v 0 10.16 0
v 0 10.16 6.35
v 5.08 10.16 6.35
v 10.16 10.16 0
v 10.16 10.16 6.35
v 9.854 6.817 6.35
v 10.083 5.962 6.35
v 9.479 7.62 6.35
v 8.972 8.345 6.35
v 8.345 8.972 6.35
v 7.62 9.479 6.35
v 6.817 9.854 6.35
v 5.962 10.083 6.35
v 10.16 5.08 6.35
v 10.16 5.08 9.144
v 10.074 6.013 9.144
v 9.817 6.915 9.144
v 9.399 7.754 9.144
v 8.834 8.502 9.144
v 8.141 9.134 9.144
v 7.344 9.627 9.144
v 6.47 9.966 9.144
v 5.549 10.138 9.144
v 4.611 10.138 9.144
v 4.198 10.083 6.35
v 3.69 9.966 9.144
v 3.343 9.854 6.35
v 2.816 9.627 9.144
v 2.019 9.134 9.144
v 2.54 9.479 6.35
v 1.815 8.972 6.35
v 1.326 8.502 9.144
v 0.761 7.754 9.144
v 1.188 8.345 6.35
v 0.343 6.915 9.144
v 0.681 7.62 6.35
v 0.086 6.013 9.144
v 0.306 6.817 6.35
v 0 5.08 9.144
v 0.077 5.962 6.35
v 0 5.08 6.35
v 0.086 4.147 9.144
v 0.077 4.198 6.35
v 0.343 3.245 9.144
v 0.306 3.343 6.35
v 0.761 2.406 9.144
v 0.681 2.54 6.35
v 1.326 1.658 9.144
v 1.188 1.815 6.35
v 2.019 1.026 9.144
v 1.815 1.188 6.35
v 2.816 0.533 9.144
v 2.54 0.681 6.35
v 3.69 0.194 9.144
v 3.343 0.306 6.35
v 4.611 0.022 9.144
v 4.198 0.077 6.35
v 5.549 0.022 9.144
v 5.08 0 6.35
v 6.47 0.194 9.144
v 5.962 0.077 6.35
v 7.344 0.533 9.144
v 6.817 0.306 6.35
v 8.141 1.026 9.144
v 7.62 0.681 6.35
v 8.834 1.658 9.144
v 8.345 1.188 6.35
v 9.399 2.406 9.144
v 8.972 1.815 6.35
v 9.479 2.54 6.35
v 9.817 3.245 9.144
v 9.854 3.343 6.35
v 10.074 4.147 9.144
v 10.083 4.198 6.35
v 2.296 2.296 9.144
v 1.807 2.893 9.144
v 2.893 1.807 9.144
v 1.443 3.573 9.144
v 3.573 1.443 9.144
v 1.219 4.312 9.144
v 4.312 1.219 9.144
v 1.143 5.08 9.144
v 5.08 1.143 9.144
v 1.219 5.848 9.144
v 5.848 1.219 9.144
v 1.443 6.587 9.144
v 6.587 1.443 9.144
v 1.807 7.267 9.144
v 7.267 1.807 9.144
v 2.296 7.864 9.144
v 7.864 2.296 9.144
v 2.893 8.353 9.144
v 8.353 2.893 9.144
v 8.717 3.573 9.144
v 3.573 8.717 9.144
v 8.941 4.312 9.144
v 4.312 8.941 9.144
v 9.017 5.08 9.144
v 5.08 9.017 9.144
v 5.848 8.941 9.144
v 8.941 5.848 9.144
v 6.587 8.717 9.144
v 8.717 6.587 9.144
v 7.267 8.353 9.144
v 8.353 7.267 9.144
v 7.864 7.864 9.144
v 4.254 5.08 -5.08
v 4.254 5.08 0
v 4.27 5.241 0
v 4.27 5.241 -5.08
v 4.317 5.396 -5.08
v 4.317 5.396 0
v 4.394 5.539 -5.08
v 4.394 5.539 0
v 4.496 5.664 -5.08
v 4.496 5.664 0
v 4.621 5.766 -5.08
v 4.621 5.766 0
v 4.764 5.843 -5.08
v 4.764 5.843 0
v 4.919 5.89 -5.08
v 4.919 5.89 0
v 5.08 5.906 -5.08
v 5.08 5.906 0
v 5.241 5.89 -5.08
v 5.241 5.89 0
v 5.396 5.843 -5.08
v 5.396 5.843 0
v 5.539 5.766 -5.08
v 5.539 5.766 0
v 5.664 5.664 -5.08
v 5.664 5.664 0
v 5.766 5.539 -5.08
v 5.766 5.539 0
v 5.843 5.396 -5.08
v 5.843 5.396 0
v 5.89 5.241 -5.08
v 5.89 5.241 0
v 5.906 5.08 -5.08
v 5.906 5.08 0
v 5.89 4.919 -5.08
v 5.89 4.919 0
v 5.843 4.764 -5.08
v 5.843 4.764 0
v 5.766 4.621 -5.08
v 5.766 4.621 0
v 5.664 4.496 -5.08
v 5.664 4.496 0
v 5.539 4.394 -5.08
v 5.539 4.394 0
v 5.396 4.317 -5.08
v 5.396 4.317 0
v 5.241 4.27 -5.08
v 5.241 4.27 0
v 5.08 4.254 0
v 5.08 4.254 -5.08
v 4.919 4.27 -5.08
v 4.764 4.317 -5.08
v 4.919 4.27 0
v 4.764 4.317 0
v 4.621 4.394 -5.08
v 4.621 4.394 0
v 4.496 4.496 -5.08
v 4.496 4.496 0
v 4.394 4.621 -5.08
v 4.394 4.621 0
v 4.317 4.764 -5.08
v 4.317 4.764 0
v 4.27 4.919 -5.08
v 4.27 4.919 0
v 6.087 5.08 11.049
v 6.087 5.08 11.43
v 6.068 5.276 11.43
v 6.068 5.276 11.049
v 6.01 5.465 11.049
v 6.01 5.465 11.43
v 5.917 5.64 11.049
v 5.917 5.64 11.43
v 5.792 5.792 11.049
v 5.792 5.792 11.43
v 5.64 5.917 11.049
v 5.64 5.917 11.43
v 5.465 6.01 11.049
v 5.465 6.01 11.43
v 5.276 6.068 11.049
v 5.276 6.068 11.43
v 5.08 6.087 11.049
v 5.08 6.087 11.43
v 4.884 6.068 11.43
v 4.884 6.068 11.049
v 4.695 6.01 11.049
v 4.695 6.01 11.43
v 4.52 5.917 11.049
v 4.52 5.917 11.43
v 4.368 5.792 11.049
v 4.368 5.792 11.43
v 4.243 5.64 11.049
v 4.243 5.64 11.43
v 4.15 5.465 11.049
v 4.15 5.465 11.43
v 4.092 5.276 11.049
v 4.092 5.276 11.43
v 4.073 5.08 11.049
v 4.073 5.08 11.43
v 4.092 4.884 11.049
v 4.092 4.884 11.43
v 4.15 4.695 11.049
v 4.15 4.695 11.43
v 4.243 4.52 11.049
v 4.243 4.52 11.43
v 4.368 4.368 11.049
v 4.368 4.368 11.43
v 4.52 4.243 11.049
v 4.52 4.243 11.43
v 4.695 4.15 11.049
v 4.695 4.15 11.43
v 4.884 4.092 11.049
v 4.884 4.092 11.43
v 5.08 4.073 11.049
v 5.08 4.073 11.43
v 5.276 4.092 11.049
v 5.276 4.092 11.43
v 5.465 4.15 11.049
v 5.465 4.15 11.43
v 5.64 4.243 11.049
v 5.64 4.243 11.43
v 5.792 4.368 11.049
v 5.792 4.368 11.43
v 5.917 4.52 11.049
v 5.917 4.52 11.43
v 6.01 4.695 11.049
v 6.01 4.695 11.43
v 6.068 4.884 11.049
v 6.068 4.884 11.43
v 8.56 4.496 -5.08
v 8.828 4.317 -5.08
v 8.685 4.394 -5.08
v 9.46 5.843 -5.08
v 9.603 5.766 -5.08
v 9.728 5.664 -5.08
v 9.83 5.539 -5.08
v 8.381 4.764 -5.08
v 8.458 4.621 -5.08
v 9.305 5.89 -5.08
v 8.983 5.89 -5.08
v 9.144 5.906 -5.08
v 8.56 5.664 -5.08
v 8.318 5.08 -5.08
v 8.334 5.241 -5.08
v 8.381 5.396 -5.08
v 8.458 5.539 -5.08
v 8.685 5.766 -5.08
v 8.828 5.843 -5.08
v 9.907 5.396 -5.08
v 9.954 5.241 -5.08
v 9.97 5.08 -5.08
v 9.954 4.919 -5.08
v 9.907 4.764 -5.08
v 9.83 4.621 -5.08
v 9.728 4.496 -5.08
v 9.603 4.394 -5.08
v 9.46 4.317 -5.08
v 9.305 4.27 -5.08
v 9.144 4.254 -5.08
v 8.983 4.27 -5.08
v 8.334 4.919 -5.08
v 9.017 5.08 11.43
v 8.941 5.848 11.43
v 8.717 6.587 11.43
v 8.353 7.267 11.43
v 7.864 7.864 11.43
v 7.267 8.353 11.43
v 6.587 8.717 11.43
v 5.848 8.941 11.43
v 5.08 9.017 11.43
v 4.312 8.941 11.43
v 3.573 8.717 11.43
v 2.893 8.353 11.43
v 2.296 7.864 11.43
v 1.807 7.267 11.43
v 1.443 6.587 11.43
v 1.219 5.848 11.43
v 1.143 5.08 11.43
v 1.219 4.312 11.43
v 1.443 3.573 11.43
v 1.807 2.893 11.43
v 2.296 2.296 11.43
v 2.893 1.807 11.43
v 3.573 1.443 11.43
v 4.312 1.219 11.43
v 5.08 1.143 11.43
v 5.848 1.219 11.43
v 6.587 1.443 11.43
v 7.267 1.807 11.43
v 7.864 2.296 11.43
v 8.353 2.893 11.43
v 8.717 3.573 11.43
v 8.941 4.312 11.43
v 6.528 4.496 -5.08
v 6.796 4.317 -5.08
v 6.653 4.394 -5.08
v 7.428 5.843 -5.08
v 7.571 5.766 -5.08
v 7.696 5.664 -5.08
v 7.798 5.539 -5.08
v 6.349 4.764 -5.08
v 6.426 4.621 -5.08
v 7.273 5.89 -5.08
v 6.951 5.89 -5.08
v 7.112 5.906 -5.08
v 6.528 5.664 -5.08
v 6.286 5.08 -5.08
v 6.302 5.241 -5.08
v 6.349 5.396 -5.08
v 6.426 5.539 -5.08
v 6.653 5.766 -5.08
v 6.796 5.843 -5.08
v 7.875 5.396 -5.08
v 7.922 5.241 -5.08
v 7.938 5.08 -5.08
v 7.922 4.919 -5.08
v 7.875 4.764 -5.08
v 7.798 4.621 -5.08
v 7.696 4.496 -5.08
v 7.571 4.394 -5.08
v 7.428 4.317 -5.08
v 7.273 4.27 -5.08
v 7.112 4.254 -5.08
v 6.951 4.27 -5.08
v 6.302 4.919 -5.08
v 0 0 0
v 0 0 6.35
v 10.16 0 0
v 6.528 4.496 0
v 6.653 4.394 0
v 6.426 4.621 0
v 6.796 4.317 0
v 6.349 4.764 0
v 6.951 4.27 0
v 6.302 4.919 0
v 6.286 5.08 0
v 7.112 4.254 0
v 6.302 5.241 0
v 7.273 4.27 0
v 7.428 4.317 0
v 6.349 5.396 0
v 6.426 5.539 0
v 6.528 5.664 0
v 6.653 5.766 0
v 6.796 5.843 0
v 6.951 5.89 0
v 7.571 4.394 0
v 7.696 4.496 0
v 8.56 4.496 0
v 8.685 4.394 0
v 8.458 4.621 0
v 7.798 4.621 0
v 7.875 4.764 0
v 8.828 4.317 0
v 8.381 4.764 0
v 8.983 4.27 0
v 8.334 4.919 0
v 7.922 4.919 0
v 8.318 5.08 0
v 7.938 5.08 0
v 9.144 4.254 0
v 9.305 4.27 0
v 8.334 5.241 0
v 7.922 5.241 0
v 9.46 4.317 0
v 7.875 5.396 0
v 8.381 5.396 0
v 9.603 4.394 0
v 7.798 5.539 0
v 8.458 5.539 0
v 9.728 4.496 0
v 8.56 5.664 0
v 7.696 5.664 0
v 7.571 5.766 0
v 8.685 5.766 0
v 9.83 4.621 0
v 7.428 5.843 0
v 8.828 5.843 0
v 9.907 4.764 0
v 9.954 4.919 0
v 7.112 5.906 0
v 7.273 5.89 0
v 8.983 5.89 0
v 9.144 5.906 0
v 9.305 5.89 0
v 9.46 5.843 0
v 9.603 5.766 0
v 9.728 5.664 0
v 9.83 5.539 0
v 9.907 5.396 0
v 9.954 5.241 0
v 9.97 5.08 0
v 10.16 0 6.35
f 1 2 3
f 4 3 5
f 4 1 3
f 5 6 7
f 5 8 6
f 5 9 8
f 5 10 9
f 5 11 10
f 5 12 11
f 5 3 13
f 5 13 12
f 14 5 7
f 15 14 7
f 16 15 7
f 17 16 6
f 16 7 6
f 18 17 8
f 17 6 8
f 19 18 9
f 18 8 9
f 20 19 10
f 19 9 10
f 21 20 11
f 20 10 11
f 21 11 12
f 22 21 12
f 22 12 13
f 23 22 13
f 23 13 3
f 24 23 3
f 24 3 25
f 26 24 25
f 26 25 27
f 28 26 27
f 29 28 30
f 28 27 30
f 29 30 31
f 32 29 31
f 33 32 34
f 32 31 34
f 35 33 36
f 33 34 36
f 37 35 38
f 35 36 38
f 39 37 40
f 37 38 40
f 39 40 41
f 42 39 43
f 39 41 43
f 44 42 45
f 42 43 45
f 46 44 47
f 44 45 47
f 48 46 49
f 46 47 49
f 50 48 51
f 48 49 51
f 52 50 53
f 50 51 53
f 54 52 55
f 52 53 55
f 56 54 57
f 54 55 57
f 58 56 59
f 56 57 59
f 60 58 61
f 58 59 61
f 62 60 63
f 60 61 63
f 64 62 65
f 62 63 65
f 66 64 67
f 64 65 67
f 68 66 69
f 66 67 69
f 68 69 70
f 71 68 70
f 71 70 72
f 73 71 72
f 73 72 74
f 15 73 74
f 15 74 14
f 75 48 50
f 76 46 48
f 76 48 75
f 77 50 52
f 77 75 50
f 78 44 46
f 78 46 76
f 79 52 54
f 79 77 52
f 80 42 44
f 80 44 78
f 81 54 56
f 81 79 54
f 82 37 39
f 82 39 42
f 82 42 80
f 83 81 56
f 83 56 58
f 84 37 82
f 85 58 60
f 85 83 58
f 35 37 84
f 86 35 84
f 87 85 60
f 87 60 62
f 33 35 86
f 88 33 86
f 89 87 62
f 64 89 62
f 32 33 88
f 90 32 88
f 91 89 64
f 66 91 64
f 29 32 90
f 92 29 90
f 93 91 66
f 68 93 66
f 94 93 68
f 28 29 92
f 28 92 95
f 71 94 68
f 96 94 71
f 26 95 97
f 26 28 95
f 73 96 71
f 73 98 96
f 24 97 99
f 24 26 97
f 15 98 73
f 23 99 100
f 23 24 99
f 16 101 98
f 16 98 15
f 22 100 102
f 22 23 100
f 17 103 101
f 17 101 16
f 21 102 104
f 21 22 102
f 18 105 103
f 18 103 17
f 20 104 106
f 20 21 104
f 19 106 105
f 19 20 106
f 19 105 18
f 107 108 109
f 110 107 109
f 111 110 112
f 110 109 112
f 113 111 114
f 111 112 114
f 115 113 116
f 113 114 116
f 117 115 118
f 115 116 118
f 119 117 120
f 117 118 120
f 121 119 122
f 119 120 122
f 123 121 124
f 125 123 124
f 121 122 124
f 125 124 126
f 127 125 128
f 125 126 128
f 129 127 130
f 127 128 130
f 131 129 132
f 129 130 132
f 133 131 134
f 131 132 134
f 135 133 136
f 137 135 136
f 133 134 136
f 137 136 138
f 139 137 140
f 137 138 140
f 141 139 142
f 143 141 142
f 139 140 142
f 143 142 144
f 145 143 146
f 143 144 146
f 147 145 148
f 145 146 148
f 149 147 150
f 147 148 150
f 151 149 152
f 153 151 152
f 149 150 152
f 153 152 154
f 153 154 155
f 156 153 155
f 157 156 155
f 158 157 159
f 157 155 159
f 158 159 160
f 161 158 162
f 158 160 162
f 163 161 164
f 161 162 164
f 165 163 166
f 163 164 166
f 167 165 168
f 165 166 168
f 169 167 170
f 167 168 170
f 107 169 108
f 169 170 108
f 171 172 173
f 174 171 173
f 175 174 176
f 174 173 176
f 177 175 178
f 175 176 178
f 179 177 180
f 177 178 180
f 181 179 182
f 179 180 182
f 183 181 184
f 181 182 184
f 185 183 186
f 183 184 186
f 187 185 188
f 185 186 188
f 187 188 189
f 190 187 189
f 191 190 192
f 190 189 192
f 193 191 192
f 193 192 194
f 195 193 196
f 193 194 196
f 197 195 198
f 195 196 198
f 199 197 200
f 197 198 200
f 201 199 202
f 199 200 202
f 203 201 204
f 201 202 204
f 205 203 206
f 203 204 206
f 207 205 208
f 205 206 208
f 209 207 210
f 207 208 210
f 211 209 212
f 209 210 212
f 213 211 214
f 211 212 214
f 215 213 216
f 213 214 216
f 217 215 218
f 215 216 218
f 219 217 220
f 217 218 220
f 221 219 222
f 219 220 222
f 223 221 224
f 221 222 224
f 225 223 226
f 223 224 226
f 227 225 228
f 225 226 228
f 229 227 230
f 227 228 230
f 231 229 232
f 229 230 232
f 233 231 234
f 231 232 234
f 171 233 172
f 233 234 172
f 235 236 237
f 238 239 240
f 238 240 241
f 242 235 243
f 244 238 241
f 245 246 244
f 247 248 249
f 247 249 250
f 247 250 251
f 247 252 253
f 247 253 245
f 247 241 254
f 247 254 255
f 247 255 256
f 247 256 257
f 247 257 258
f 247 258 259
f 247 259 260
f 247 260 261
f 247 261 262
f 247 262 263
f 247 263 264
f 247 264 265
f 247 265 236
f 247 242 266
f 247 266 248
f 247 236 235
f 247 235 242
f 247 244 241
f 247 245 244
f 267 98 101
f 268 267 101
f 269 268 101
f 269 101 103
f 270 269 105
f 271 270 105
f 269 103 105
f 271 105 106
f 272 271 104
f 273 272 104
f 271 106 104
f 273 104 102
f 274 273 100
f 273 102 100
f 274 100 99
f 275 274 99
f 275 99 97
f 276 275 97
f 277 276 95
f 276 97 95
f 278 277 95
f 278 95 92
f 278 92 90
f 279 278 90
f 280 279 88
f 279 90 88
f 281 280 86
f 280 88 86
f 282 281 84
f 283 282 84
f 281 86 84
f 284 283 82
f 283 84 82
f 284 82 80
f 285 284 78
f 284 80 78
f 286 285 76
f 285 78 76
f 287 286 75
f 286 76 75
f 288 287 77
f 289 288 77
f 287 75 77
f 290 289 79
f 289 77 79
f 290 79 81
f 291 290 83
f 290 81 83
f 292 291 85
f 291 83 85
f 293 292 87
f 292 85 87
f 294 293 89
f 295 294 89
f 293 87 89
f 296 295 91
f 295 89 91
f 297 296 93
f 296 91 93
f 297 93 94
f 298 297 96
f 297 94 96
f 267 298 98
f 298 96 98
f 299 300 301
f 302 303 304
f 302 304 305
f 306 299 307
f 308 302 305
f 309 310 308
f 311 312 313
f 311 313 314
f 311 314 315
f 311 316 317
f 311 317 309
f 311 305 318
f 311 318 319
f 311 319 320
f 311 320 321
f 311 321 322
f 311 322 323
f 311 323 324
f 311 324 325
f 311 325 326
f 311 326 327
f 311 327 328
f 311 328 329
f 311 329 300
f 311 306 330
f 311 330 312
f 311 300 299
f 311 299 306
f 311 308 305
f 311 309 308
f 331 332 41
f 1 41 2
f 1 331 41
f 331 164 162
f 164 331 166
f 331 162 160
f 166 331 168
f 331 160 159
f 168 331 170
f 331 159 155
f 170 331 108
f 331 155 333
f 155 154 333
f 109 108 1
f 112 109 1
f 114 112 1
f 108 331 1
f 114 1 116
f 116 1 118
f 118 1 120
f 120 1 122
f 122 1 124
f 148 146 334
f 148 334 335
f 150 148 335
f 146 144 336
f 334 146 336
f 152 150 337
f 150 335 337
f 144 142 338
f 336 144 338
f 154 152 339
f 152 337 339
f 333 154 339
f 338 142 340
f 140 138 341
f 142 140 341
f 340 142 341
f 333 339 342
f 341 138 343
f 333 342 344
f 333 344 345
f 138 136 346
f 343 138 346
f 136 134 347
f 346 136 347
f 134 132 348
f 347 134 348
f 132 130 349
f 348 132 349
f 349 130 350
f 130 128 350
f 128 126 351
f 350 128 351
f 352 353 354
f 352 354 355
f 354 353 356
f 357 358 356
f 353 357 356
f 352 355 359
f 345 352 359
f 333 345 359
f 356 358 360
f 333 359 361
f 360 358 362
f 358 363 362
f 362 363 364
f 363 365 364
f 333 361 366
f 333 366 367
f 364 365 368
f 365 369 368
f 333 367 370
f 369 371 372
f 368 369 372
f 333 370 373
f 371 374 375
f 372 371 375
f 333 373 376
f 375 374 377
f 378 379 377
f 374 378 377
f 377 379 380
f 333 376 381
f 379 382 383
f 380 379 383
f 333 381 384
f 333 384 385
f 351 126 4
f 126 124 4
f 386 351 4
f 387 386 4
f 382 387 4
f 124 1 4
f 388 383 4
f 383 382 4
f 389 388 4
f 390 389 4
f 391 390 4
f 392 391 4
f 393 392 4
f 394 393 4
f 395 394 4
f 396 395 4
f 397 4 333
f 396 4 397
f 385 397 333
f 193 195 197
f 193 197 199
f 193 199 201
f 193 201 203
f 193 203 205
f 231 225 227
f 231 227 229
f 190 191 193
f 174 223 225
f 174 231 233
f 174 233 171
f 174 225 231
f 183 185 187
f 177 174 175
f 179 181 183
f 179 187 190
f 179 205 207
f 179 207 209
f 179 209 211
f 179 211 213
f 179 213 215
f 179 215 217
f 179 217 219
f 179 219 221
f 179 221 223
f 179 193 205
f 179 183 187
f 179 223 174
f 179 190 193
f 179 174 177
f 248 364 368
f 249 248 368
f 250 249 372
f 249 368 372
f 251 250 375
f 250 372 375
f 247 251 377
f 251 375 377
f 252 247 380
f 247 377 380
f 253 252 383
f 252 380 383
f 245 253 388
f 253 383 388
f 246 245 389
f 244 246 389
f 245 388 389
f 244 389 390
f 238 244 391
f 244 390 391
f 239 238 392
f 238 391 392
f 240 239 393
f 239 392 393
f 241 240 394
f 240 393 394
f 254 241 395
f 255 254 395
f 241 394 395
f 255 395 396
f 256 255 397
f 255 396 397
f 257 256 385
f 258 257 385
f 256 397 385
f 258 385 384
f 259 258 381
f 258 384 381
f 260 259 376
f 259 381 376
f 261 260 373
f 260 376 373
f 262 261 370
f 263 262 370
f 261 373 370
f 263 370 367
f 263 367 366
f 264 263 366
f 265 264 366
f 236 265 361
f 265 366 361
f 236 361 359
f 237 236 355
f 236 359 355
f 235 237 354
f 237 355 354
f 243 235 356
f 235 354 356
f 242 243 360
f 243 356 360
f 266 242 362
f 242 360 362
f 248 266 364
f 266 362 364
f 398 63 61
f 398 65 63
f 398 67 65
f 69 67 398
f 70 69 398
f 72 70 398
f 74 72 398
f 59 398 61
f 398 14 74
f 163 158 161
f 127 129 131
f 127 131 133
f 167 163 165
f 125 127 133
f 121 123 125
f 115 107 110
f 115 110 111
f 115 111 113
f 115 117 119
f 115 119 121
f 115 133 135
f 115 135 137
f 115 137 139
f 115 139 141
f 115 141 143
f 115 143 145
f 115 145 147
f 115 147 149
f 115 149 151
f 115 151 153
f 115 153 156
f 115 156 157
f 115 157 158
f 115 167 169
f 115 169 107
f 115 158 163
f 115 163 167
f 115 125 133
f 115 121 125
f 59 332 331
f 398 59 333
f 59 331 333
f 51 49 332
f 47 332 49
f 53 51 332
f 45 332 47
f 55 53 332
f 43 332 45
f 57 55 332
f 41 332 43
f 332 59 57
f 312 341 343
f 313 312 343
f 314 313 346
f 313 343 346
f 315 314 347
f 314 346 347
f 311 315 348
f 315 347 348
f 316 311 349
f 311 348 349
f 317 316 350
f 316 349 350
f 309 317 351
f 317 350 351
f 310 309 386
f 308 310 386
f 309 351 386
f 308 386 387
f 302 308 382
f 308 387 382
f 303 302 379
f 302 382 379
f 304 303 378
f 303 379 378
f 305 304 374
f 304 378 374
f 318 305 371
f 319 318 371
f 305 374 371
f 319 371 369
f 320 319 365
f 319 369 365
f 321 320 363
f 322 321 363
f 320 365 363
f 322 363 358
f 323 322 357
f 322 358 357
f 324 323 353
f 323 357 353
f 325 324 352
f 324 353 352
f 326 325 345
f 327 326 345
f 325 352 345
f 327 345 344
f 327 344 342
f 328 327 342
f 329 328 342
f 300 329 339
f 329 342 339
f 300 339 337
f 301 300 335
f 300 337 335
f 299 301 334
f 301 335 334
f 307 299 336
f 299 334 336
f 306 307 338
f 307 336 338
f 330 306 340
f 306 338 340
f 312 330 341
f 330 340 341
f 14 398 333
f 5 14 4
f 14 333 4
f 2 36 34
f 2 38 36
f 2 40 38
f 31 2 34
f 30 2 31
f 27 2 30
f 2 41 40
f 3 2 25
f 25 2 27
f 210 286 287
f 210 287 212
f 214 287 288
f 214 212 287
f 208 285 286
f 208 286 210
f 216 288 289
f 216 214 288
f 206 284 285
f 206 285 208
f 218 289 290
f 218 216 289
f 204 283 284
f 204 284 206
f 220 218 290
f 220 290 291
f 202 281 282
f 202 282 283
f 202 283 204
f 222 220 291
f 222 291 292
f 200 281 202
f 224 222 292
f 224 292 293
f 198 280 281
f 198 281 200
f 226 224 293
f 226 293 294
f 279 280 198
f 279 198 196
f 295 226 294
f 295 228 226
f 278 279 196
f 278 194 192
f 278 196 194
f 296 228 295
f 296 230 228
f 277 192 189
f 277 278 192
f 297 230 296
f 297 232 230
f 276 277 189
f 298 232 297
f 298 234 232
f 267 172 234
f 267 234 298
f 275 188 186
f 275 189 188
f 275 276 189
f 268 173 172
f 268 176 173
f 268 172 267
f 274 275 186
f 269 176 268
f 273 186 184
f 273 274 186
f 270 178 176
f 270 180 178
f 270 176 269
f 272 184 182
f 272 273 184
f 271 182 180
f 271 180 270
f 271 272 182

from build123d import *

# Parameters (mm, degrees)
SKETCH1_W      = 10.16
SKETCH1_H      = 10.16
EXTRUDE1_DEPTH = 6.35
SKETCH2_R      = 5.08
EXTRUDE2_DEPTH = 2.794
SKETCH3_R      = 3.937
EXTRUDE3_DEPTH = 2.286
SKETCH4_R      = 1.007103889
EXTRUDE4_DEPTH = 0.381
SKETCH5_R      = 0.8255
EXTRUDE5_DEPTH = 5.08


with BuildPart() as part:
    # Sketch1 → Extrude1 (new body)
    with BuildSketch(Plane.XY):
        with Locations((5.08, 5.08)):
            Rectangle(SKETCH1_W, SKETCH1_H)
    extrude(amount=EXTRUDE1_DEPTH)

    # Sketch2 → Extrude2 (add)
    with BuildSketch(Plane.XY.offset(6.35)):
        with Locations((5.08, 5.08)):
            Circle(SKETCH2_R)
    extrude(amount=EXTRUDE2_DEPTH)

    # Sketch3 → Extrude3 (add)
    with BuildSketch(Plane.XY.offset(9.144)):
        with Locations((5.08, 5.08)):
            Circle(SKETCH3_R)
    extrude(amount=EXTRUDE3_DEPTH)

    # Sketch4 → Extrude4 (cut)
    with BuildSketch(Plane.XY.offset(11.43)):
        with Locations((5.08, 5.08)):
            Circle(SKETCH4_R)
    extrude(amount=-EXTRUDE4_DEPTH, mode=Mode.SUBTRACT)

    # Sketch5 → Extrude5 (add)
    with BuildSketch(Plane(origin=(0, 0, 0), x_dir=(-1, 0, 0), z_dir=(0, 0, -1))):
        with Locations((-5.08, 5.08)):
            Circle(SKETCH5_R)
        with Locations((-7.112, 5.08)):
            Circle(SKETCH5_R)
        with Locations((-9.144, 5.08)):
            Circle(SKETCH5_R)
    extrude(amount=EXTRUDE5_DEPTH)


solid = part.part
